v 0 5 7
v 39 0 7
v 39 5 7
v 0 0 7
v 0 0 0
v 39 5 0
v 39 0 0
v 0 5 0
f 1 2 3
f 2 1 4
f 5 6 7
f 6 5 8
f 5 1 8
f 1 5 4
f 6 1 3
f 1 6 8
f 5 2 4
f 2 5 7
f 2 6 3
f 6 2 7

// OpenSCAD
translate([1.5, 2.5, 3.5]) color([0.9928835035123682, 0.8462248334797323, 0.9789066021625461]) cube([3, 5, 7], center=true);
translate([4.5, 2.5, 3.5]) color([0.6868956228130294, 0.08137290691060206, 0.9493092651810784]) cube([3, 5, 7], center=true);
translate([7.5, 2.5, 3.5]) color([0.9246190463677613, 0.3951154575230438, 0.3612783181755085]) cube([3, 5, 7], center=true);
translate([10.5, 2.5, 3.5]) color([0.11615210489091876, 0.0037403702712440756, 0.2703277384724262]) cube([3, 5, 7], center=true);
translate([13.5, 2.5, 3.5]) color([0.6403732426441148, 0.29252642189785794, 0.9007258804640697]) cube([3, 5, 7], center=true);
translate([16.5, 2.5, 3.5]) color([0.14067978971908934, 0.5728503338092871, 0.1912043400515635]) cube([3, 5, 7], center=true);
translate([19.5, 2.5, 3.5]) color([0.43401891336511733, 0.7163457448050065, 0.3841301513333275]) cube([3, 5, 7], center=true);
translate([22.5, 2.5, 3.5]) color([0.33069552050314754, 0.6480049557775331, 0.6874717059379091]) cube([3, 5, 7], center=true);
translate([25.5, 2.5, 3.5]) color([0.14801928734251768, 0.93323205939552, 0.14750072005511716]) cube([3, 5, 7], center=true);
translate([28.5, 2.5, 3.5]) color([0.31607169754224296, 0.2088660889148145, 0.1868244368145192]) cube([3, 5, 7], center=true);
translate([31.5, 2.5, 3.5]) color([0.3491672112743387, 0.9834841816788549, 0.427290207198605]) cube([3, 5, 7], center=true);
translate([34.0, 1.5, 2.5]) color([0.49195852420878716, 0.7297831417632067, 0.7955834433152874]) cube([2, 3, 5], center=true);
translate([34.5, 4.0, 2.5]) color([0.43927203819181504, 0.2042687131951023, 0.709997013582239]) cube([3, 2, 5], center=true);
translate([34.5, 2.5, 6.0]) color([0.9058221085991531, 0.03327924187503195, 0.6331757983912308]) cube([3, 5, 2], center=true);
translate([36.0, 1.5, 2.5]) color([0.8710093735661795, 0.3636101637556439, 0.7431628081058981]) cube([2, 3, 5], center=true);
translate([37.5, 4.0, 2.5]) color([0.6774926049513658, 0.23306417175218364, 0.2975271762349214]) cube([3, 2, 5], center=true);
translate([38.0, 1.5, 2.5]) color([0.0866296567389645, 0.8688435220131177, 0.7514921149941085]) cube([2, 3, 5], center=true);
translate([37.5, 2.5, 6.0]) color([0.7714305883456576, 0.8829516943772963, 0.4114323292545551]) cube([3, 5, 2], center=true);
